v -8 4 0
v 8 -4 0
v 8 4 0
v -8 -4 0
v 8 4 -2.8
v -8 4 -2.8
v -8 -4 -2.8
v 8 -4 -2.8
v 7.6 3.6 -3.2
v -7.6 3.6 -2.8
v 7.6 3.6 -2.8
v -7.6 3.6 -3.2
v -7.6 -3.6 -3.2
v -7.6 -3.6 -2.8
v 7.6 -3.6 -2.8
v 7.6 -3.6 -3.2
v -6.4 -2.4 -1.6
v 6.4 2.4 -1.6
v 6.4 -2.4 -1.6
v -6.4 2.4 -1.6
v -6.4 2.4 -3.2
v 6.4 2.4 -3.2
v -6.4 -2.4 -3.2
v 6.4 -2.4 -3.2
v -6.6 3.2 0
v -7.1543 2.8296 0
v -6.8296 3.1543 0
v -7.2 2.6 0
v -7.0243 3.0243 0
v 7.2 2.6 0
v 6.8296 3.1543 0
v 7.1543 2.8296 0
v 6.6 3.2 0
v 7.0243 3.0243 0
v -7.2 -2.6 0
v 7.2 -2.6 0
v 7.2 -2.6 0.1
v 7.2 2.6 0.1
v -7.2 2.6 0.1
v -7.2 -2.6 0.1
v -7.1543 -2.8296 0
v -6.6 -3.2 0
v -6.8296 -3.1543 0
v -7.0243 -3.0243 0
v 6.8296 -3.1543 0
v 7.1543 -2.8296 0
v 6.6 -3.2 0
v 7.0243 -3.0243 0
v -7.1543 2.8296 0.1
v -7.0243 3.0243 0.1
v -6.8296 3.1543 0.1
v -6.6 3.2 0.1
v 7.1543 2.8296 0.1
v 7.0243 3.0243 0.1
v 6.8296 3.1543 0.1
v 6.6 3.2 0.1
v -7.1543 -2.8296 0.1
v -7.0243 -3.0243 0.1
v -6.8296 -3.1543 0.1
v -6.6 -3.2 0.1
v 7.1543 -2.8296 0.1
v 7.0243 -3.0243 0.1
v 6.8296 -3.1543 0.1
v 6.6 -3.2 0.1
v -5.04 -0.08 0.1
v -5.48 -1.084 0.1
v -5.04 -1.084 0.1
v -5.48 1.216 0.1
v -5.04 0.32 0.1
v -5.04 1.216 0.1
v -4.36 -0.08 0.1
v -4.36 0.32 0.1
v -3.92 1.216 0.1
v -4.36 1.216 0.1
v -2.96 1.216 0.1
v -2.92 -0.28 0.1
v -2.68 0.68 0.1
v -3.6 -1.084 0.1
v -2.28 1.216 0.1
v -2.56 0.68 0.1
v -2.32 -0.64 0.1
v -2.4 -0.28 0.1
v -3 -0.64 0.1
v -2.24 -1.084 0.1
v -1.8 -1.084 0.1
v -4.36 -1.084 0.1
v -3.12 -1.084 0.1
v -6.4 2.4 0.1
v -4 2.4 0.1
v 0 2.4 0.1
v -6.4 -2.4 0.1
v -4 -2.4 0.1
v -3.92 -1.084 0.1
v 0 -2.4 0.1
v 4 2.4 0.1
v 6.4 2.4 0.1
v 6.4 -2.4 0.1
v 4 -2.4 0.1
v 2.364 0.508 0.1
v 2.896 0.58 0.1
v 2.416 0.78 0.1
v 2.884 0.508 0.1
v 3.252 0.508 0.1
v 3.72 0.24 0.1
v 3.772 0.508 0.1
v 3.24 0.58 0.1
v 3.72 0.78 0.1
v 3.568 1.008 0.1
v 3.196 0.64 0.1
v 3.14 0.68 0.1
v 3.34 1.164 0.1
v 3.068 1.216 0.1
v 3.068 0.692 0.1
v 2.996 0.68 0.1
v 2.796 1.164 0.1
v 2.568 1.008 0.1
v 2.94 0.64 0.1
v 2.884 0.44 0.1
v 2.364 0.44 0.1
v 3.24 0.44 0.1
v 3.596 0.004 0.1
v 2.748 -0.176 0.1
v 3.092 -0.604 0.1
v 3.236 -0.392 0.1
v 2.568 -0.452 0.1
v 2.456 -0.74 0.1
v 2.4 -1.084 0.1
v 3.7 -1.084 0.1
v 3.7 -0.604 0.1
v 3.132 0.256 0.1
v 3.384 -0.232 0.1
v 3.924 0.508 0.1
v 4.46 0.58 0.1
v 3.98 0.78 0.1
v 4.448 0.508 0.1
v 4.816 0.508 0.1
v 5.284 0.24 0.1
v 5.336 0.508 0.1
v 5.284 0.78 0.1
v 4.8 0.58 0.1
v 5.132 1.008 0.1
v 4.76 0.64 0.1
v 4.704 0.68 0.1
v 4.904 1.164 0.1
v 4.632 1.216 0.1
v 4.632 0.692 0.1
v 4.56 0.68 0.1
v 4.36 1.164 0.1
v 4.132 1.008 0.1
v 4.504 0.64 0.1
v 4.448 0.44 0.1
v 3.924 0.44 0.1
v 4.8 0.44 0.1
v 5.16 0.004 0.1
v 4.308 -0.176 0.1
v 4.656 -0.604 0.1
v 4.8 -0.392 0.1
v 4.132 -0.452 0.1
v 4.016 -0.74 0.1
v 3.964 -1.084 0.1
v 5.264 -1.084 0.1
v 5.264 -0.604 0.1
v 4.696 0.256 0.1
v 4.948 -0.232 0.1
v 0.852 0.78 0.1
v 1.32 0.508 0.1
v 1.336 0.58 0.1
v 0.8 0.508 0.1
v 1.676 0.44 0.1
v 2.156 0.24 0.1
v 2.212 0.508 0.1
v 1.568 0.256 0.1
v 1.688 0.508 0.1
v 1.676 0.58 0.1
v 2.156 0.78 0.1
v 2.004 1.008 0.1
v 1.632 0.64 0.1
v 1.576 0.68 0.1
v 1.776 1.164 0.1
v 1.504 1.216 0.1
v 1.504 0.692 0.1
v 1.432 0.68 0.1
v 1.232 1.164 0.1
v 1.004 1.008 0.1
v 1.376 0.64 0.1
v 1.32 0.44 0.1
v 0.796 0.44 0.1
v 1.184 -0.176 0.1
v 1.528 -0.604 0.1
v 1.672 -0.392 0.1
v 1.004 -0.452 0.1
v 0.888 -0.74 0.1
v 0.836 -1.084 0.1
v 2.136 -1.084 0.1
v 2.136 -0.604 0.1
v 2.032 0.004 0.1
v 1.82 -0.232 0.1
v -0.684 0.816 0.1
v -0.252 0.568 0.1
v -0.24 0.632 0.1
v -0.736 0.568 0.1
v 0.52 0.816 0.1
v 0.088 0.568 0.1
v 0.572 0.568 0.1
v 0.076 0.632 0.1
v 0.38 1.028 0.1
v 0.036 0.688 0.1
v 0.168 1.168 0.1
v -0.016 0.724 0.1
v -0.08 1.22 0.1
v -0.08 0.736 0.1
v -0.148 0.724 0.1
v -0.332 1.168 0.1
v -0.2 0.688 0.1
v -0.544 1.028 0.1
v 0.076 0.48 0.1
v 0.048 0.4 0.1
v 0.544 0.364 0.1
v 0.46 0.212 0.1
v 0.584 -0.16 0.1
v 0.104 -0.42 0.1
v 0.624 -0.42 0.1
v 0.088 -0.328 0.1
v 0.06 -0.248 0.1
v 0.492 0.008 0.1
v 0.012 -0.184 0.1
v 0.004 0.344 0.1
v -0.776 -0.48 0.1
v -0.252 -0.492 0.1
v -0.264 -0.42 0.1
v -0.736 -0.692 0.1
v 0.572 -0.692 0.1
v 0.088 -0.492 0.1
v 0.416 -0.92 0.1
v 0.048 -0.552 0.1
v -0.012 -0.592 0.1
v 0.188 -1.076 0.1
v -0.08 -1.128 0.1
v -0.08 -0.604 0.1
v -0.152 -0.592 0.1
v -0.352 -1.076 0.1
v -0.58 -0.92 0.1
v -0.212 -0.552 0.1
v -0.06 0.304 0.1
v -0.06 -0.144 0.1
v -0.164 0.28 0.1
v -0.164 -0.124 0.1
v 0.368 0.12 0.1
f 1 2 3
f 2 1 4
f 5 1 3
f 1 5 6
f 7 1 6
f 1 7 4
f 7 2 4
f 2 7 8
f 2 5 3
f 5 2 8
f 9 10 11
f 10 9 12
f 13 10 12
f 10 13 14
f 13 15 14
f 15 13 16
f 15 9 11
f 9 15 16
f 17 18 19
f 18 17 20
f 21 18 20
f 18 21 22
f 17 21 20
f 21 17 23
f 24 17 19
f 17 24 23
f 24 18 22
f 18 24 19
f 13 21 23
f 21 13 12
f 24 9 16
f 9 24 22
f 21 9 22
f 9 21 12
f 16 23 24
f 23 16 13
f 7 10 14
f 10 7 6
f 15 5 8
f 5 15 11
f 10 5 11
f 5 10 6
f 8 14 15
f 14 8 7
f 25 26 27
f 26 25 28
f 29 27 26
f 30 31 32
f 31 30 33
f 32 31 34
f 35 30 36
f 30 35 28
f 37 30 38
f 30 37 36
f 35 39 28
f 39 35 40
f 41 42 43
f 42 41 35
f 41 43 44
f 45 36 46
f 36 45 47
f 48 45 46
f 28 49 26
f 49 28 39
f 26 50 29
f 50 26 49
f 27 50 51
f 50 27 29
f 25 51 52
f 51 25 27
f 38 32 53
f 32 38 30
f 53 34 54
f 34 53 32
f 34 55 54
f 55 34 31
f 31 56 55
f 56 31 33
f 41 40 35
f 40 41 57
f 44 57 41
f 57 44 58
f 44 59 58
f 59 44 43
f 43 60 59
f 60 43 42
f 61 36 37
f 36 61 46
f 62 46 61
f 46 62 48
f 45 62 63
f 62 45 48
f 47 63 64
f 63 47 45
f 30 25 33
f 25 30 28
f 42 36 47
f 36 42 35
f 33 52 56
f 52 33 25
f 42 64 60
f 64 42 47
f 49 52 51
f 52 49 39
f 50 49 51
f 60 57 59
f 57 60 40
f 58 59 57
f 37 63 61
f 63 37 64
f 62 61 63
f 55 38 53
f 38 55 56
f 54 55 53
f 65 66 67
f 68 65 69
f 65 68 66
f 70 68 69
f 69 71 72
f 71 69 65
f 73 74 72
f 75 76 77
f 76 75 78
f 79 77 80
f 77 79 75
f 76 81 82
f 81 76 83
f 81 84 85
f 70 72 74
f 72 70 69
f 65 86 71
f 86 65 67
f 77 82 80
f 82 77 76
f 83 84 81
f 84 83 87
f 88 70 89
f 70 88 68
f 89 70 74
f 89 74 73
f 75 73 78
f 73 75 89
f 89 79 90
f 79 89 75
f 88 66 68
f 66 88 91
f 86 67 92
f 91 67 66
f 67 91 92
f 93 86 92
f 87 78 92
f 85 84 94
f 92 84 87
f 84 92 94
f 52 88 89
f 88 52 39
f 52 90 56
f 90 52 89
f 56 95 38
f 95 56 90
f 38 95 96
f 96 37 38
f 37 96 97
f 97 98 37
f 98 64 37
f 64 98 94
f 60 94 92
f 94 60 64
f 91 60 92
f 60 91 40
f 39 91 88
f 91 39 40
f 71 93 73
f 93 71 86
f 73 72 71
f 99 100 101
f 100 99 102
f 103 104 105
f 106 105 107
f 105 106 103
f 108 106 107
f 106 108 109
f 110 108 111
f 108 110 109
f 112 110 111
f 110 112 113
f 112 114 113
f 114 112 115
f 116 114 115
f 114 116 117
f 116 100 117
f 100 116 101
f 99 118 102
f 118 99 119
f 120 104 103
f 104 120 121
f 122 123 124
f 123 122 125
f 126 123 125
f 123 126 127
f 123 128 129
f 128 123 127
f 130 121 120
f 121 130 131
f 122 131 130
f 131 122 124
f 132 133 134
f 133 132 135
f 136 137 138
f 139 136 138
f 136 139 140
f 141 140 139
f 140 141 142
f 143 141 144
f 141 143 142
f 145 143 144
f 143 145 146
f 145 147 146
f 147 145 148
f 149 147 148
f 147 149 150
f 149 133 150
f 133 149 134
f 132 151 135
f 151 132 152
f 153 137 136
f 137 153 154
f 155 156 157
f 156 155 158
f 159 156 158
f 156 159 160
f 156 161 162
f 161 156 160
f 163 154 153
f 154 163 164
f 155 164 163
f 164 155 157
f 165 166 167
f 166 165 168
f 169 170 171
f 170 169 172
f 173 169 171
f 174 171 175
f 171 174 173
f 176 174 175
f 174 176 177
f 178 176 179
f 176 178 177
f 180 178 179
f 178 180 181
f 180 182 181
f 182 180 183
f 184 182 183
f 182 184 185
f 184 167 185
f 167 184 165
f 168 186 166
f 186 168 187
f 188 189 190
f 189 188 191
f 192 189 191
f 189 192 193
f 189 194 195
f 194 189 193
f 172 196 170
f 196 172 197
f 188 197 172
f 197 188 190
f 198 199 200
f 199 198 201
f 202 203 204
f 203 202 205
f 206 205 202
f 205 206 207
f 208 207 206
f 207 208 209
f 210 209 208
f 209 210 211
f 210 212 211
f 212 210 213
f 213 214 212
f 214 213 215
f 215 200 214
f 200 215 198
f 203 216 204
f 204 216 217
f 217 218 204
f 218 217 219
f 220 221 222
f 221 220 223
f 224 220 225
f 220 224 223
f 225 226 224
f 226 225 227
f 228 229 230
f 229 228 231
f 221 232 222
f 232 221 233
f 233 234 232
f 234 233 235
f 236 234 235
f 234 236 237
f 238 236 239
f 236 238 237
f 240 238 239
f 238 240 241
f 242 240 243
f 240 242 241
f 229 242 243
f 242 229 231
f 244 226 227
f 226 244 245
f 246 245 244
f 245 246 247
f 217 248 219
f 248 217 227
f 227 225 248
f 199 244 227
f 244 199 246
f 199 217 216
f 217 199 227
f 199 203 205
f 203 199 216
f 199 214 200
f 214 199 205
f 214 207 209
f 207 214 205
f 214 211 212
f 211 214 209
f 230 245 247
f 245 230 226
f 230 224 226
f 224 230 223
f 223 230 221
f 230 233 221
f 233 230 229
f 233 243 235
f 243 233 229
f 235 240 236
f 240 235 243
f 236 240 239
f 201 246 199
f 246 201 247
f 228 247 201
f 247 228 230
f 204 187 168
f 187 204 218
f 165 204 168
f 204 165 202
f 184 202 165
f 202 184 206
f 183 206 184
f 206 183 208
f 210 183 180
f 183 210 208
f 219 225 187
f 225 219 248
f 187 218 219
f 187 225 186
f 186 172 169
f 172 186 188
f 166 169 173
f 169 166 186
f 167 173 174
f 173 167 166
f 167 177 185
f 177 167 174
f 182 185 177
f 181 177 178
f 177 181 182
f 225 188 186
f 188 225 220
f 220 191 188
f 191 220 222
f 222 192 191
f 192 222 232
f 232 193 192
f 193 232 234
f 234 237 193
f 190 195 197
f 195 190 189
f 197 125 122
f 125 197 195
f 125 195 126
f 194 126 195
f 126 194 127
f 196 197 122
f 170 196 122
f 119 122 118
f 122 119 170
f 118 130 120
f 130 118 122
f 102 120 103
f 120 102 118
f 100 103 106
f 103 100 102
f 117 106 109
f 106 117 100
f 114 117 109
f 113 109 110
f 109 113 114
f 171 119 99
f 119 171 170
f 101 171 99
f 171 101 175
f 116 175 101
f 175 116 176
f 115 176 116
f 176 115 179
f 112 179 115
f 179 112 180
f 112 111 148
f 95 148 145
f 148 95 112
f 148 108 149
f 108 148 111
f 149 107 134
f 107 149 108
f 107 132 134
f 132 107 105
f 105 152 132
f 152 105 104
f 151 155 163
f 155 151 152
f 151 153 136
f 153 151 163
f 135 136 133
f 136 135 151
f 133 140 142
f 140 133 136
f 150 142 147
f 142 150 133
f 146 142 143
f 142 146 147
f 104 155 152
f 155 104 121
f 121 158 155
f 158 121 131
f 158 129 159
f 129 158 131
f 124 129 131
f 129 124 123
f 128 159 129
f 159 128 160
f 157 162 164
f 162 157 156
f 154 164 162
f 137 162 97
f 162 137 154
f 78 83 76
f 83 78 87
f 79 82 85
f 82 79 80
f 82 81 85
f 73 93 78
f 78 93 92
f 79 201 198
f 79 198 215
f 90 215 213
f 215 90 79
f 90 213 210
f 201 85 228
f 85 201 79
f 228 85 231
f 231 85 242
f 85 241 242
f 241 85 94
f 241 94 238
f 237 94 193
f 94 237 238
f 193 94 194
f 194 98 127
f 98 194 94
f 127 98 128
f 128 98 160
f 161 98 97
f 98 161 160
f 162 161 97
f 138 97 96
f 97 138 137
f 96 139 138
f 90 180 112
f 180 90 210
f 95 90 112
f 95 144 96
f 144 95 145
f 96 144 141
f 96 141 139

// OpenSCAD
// file: ../p/box3u12.scad
use <../lib.scad>
function ldraw_lib__box3u12() = [
// 0 Box with 3 Parallel Faces without Any Edges
// 0 Name: box3u12.dat
// 0 Author: J.C. Tchang [tchang]
// 0 !LDRAW_ORG Primitive UPDATE 2014-02
// 0 !LICENSE Licensed under CC BY 4.0 : see CAreadme.txt
// 
// 0 BFC CERTIFY CCW
  [0,"BFC","CERTIFY"],
  [0,"BFC","CCW"],
// 
// 0 !HISTORY 2014-12-23 [PTadmin] Official Update 2014-02
// 
// 
// 4 16 -1 1 1 1 1 1 1 1 -1 -1 1 -1
  [4,16,-1,1,1,1,1,1,1,1,-1,-1,1,-1],
// 4 16 -1 1 1 -1 0 1 1 0 1 1 1 1
  [4,16,-1,1,1,-1,0,1,1,0,1,1,1,1],
// 4 16 1 1 -1 1 0 -1 -1 0 -1 -1 1 -1
  [4,16,1,1,-1,1,0,-1,-1,0,-1,-1,1,-1],
];
module ldraw_lib__box3u12(step=0, col=false, unit=2/5, alt=false, line=0.2, solid=!$preview)
    makepoly(ldraw_lib__box3u12(), step=step, col=col, unit=unit, alt=alt, line=line, solid=solid);
ldraw_lib__box3u12(line=0.2);
// file: ../p/1-4cyli.scad
use <../lib.scad>
function ldraw_lib__1_4cyli() = [
// 0 Cylinder 0.25
// 0 Name: 1-4cyli.dat
// 0 Author: James Jessiman
// 0 !LDRAW_ORG Primitive UPDATE 2012-01
// 0 !LICENSE Licensed under CC BY 4.0 : see CAreadme.txt
// 
// 0 BFC CERTIFY CCW
  [0,"BFC","CERTIFY"],
  [0,"BFC","CCW"],
// 
// 0 !HISTORY 2002-03-23 [sbliss] Added BFC statement.
// 0 !HISTORY 2002-04-25 [PTadmin] Official Update 2002-02
// 0 !HISTORY 2007-06-22 [PTadmin] Header formatted for Contributor Agreement
// 0 !HISTORY 2008-07-01 [PTadmin] Official Update 2008-01
// 0 !HISTORY 2012-02-16 [Philo] Changed to CCW
// 0 !HISTORY 2012-03-30 [PTadmin] Official Update 2012-01
// 
// 
// 4 16 1 1 0 0.9239 1 0.3827 0.9239 0 0.3827 1 0 0
  [4,16,1,1,0,0.9239,1,0.3827,0.9239,0,0.3827,1,0,0],
// 5 24 1 0 0 1 1 0 0.9239 0 0.3827 1 0 -1
  [5,24,1,0,0,1,1,0,0.9239,0,0.3827,1,0,-1],
// 4 16 0.9239 1 0.3827 0.7071 1 0.7071 0.7071 0 0.7071 0.9239 0 0.3827
  [4,16,0.9239,1,0.3827,0.7071,1,0.7071,0.7071,0,0.7071,0.9239,0,0.3827],
// 5 24 0.9239 0 0.3827 0.9239 1 0.3827 0.7071 0 0.7071 1 0 0
  [5,24,0.9239,0,0.3827,0.9239,1,0.3827,0.7071,0,0.7071,1,0,0],
// 4 16 0.7071 1 0.7071 0.3827 1 0.9239 0.3827 0 0.9239 0.7071 0 0.7071
  [4,16,0.7071,1,0.7071,0.3827,1,0.9239,0.3827,0,0.9239,0.7071,0,0.7071],
// 5 24 0.7071 0 0.7071 0.7071 1 0.7071 0.3827 0 0.9239 0.9239 0 0.3827
  [5,24,0.7071,0,0.7071,0.7071,1,0.7071,0.3827,0,0.9239,0.9239,0,0.3827],
// 4 16 0.3827 1 0.9239 0 1 1 0 0 1 0.3827 0 0.9239
  [4,16,0.3827,1,0.9239,0,1,1,0,0,1,0.3827,0,0.9239],
// 5 24 0.3827 0 0.9239 0.3827 1 0.9239 0 0 1 0.7071 0 0.7071
  [5,24,0.3827,0,0.9239,0.3827,1,0.9239,0,0,1,0.7071,0,0.7071],
// 5 24 0 0 1 0 1 1 0.3827 0 0.9239 -1 0 1
  [5,24,0,0,1,0,1,1,0.3827,0,0.9239,-1,0,1],
];
module ldraw_lib__1_4cyli(step=0, col=false, unit=2/5, alt=false, line=0.2, solid=!$preview)
    makepoly(ldraw_lib__1_4cyli(), step=step, col=col, unit=unit, alt=alt, line=line, solid=solid);
ldraw_lib__1_4cyli(line=0.2);
// file: ../p/box5.scad
use <../lib.scad>
function ldraw_lib__box5() = [
// 0 Box with 5 Faces and All Edges
// 0 Name: box5.dat
// 0 Author: James Jessiman
// 0 !LDRAW_ORG Primitive UPDATE 2012-01
// 0 !LICENSE Licensed under CC BY 4.0 : see CAreadme.txt
// 
// 0 BFC CERTIFY CCW
  [0,"BFC","CERTIFY"],
  [0,"BFC","CCW"],
// 
// 0 !HISTORY 2002-04-03 [sbliss] Modified for BFC compliance
// 0 !HISTORY 2002-04-25 [PTadmin] Official Update 2002-02
// 0 !HISTORY 2007-06-24 [PTadmin] Header formatted for Contributor Agreement
// 0 !HISTORY 2008-07-01 [PTadmin] Official Update 2008-01
// 0 !HISTORY 2012-02-16 [Philo] Changed to CCW
// 0 !HISTORY 2012-03-30 [PTadmin] Official Update 2012-01
// 
// 
// 2 24 1 1 1 -1 1 1
  [2,24,1,1,1,-1,1,1],
// 2 24 -1 1 1 -1 1 -1
  [2,24,-1,1,1,-1,1,-1],
// 2 24 -1 1 -1 1 1 -1
  [2,24,-1,1,-1,1,1,-1],
// 2 24 1 1 -1 1 1 1
  [2,24,1,1,-1,1,1,1],
// 2 24 1 0 1 -1 0 1
  [2,24,1,0,1,-1,0,1],
// 2 24 -1 0 1 -1 0 -1
  [2,24,-1,0,1,-1,0,-1],
// 2 24 -1 0 -1 1 0 -1
  [2,24,-1,0,-1,1,0,-1],
// 2 24 1 0 -1 1 0 1
  [2,24,1,0,-1,1,0,1],
// 2 24 1 0 1 1 1 1
  [2,24,1,0,1,1,1,1],
// 2 24 -1 0 1 -1 1 1
  [2,24,-1,0,1,-1,1,1],
// 2 24 1 0 -1 1 1 -1
  [2,24,1,0,-1,1,1,-1],
// 2 24 -1 0 -1 -1 1 -1
  [2,24,-1,0,-1,-1,1,-1],
// 4 16 -1 1 1 1 1 1 1 1 -1 -1 1 -1
  [4,16,-1,1,1,1,1,1,1,1,-1,-1,1,-1],
// 4 16 -1 1 1 -1 0 1 1 0 1 1 1 1
  [4,16,-1,1,1,-1,0,1,1,0,1,1,1,1],
// 4 16 -1 1 -1 -1 0 -1 -1 0 1 -1 1 1
  [4,16,-1,1,-1,-1,0,-1,-1,0,1,-1,1,1],
// 4 16 1 1 -1 1 0 -1 -1 0 -1 -1 1 -1
  [4,16,1,1,-1,1,0,-1,-1,0,-1,-1,1,-1],
// 4 16 1 1 1 1 0 1 1 0 -1 1 1 -1
  [4,16,1,1,1,1,0,1,1,0,-1,1,1,-1],
];
module ldraw_lib__box5(step=0, col=false, unit=2/5, alt=false, line=0.2, solid=!$preview)
    makepoly(ldraw_lib__box5(), step=step, col=col, unit=unit, alt=alt, line=line, solid=solid);
ldraw_lib__box5(line=0.2);
// file: ../p/box4.scad
use <../lib.scad>
function ldraw_lib__box4() = [
// 0 Box with 4 Faces (2 Parallel Pairs) and All Edges
// 0 Name: box4.dat
// 0 Author: James Jessiman
// 0 !LDRAW_ORG Primitive UPDATE 2012-01
// 0 !LICENSE Licensed under CC BY 4.0 : see CAreadme.txt
// 
// 0 BFC CERTIFY CCW
  [0,"BFC","CERTIFY"],
  [0,"BFC","CCW"],
// 
// 0 !HISTORY 2002-04-03 [sbliss] Modified for BFC compliance
// 0 !HISTORY 2002-04-25 [PTadmin] Official Update 2002-02
// 0 !HISTORY 2007-06-24 [PTadmin] Header formatted for Contributor Agreement
// 0 !HISTORY 2008-07-01 [PTadmin] Official Update 2008-01
// 0 !HISTORY 2012-02-16 [Philo] Changed to CCW
// 0 !HISTORY 2012-03-30 [PTadmin] Official Update 2012-01
// 
// 
// 2 24 1 1 1 -1 1 1
  [2,24,1,1,1,-1,1,1],
// 2 24 -1 1 1 -1 1 -1
  [2,24,-1,1,1,-1,1,-1],
// 2 24 -1 1 -1 1 1 -1
  [2,24,-1,1,-1,1,1,-1],
// 2 24 1 1 -1 1 1 1
  [2,24,1,1,-1,1,1,1],
// 2 24 1 0 1 -1 0 1
  [2,24,1,0,1,-1,0,1],
// 2 24 -1 0 1 -1 0 -1
  [2,24,-1,0,1,-1,0,-1],
// 2 24 -1 0 -1 1 0 -1
  [2,24,-1,0,-1,1,0,-1],
// 2 24 1 0 -1 1 0 1
  [2,24,1,0,-1,1,0,1],
// 2 24 1 0 1 1 1 1
  [2,24,1,0,1,1,1,1],
// 2 24 -1 0 1 -1 1 1
  [2,24,-1,0,1,-1,1,1],
// 2 24 1 0 -1 1 1 -1
  [2,24,1,0,-1,1,1,-1],
// 2 24 -1 0 -1 -1 1 -1
  [2,24,-1,0,-1,-1,1,-1],
// 4 16 -1 1 1 -1 0 1 1 0 1 1 1 1
  [4,16,-1,1,1,-1,0,1,1,0,1,1,1,1],
// 4 16 -1 1 -1 -1 0 -1 -1 0 1 -1 1 1
  [4,16,-1,1,-1,-1,0,-1,-1,0,1,-1,1,1],
// 4 16 1 1 -1 1 0 -1 -1 0 -1 -1 1 -1
  [4,16,1,1,-1,1,0,-1,-1,0,-1,-1,1,-1],
// 4 16 1 1 1 1 0 1 1 0 -1 1 1 -1
  [4,16,1,1,1,1,0,1,1,0,-1,1,1,-1],
];
module ldraw_lib__box4(step=0, col=false, unit=2/5, alt=false, line=0.2, solid=!$preview)
    makepoly(ldraw_lib__box4(), step=step, col=col, unit=unit, alt=alt, line=line, solid=solid);
ldraw_lib__box4(line=0.2);
// file: s/stickerback008x018.scad
use <../../lib.scad>
use <../../p/1-4chrd.scad>
use <../../p/1-4cyli.scad>
use <../../p/box3u12.scad>
function ldraw_lib__s__stickerback008x018() = [
// 0 ~Sticker Back  0.8 x  1.8
// 0 Name: s\stickerback008x018.dat
// 0 Author: Massimo Maso [Sirio]
// 0 !LDRAW_ORG Subpart UPDATE 2025-08
// 0 !LICENSE Licensed under CC BY 4.0 : see CAreadme.txt
// 
// 0 BFC CERTIFY CCW
  [0,"BFC","CERTIFY"],
  [0,"BFC","CCW"],
// 
// 0 !HISTORY 2025-08-31 [OrionP] Official Update 2025-08
// 
// 0 // Primitives
// 1 16 -16.5 0 6.5 -1.5 0 0 0 -1 0 0 0 1.5 1-4chrd.dat
  [1,16,-16.5,0,6.5,-1.5,0,0,0,-1,0,0,0,1.5, ldraw_lib__1_4chrd()],
// 1 16 16.5 0 6.5 1.5 0 0 0 -1 0 0 0 1.5 1-4chrd.dat
  [1,16,16.5,0,6.5,1.5,0,0,0,-1,0,0,0,1.5, ldraw_lib__1_4chrd()],
// 1 16 0 -.25 0 0 0 18 0 .25 0 6.5 0 0 box3u12.dat
  [1,16,0,-.25,0,0,0,18,0,.25,0,6.5,0,0, ldraw_lib__box3u12()],
// 1 16 -16.5 0 -6.5 -1.5 0 0 0 -1 0 0 0 -1.5 1-4chrd.dat
  [1,16,-16.5,0,-6.5,-1.5,0,0,0,-1,0,0,0,-1.5, ldraw_lib__1_4chrd()],
// 1 16 16.5 0 -6.5 1.5 0 0 0 -1 0 0 0 -1.5 1-4chrd.dat
  [1,16,16.5,0,-6.5,1.5,0,0,0,-1,0,0,0,-1.5, ldraw_lib__1_4chrd()],
// 1 16 -16.5 0 6.5 -1.5 0 0 0 -.25 0 0 0 1.5 1-4cyli.dat
  [1,16,-16.5,0,6.5,-1.5,0,0,0,-.25,0,0,0,1.5, ldraw_lib__1_4cyli()],
// 1 16 16.5 0 6.5 1.5 0 0 0 -.25 0 0 0 1.5 1-4cyli.dat
  [1,16,16.5,0,6.5,1.5,0,0,0,-.25,0,0,0,1.5, ldraw_lib__1_4cyli()],
// 1 16 -16.5 0 -6.5 -1.5 0 0 0 -.25 0 0 0 -1.5 1-4cyli.dat
  [1,16,-16.5,0,-6.5,-1.5,0,0,0,-.25,0,0,0,-1.5, ldraw_lib__1_4cyli()],
// 1 16 16.5 0 -6.5 1.5 0 0 0 -.25 0 0 0 -1.5 1-4cyli.dat
  [1,16,16.5,0,-6.5,1.5,0,0,0,-.25,0,0,0,-1.5, ldraw_lib__1_4cyli()],
// 0 // Bottom face
// 4 16 -18 0 6.5 -16.5 0 8 16.5 0 8 18 0 6.5
  [4,16,-18,0,6.5,-16.5,0,8,16.5,0,8,18,0,6.5],
// 4 16 -18 0 -6.5 18 0 -6.5 16.5 0 -8 -16.5 0 -8
  [4,16,-18,0,-6.5,18,0,-6.5,16.5,0,-8,-16.5,0,-8],
// 0 // Lateral face
// 4 16 -16.5 0 8 -16.5 -.25 8 16.5 -.25 8 16.5 0 8
  [4,16,-16.5,0,8,-16.5,-.25,8,16.5,-.25,8,16.5,0,8],
// 4 16 -16.5 0 -8 16.5 0 -8 16.5 -.25 -8 -16.5 -.25 -8
  [4,16,-16.5,0,-8,16.5,0,-8,16.5,-.25,-8,-16.5,-.25,-8],
];
module ldraw_lib__s__stickerback008x018(step=0, col=false, unit=2/5, alt=false, line=0.2, solid=!$preview)
    makepoly(ldraw_lib__s__stickerback008x018(), step=step, col=col, unit=unit, alt=alt, line=line, solid=solid);
ldraw_lib__s__stickerback008x018(line=0.2);
// file: ../p/1-4chrd.scad
use <../lib.scad>
function ldraw_lib__1_4chrd() = [
// 0 Chord 0.25
// 0 Name: 1-4chrd.dat
// 0 Author: Max Martin Richter [MMR1988]
// 0 !LDRAW_ORG Primitive UPDATE 2023-05
// 0 !LICENSE Licensed under CC BY 4.0 : see CAreadme.txt
// 
// 0 BFC CERTIFY CCW
  [0,"BFC","CERTIFY"],
  [0,"BFC","CCW"],
// 
// 0 !HISTORY 2004-04-22 [PTadmin] Official Update 2004-02
// 0 !HISTORY 2007-10-09 [PTadmin] Header formatted for Contributor Agreement
// 0 !HISTORY 2008-07-01 [PTadmin] Official Update 2008-01
// 0 !HISTORY 2012-08-02 [MMR1988] Re-creation with PrimGen2 and Rectifier
// 0 !HISTORY 2012-08-09 [PTadmin] Official Update 2012-02
// 0 !HISTORY 2023-10-27 [OrionP] Change author to MMR1988 from hafhead
// 0 !HISTORY 2023-10-31 [OrionP] Official Update 2023-05
// 
// 4 16 0.9239 0 0.3827 0.3827 0 0.9239 0 0 1 1 0 0
  [4,16,0.9239,0,0.3827,0.3827,0,0.9239,0,0,1,1,0,0],
// 3 16 0.7071 0 0.7071 0.3827 0 0.9239 0.9239 0 0.3827
  [3,16,0.7071,0,0.7071,0.3827,0,0.9239,0.9239,0,0.3827],
];
module ldraw_lib__1_4chrd(step=0, col=false, unit=2/5, alt=false, line=0.2, solid=!$preview)
    makepoly(ldraw_lib__1_4chrd(), step=step, col=col, unit=unit, alt=alt, line=line, solid=solid);
ldraw_lib__1_4chrd(line=0.2);
// file: s/3069bs01.scad
use <../../lib.scad>
use <../../p/box4.scad>
use <../../p/box5.scad>
function ldraw_lib__s__3069bs01() = [
// 0 ~Tile  1 x  2 with Groove without Top Face
// 0 Name: s\3069bs01.dat
// 0 Author: Santeri Piippo [arezey]
// 0 !LDRAW_ORG Subpart UPDATE 2010-02
// 0 !LICENSE Licensed under CC BY 4.0 : see CAreadme.txt
// 
// 0 BFC CERTIFY CCW
  [0,"BFC","CERTIFY"],
  [0,"BFC","CCW"],
// 
// 0 !HISTORY 2010-07-05 [PTadmin] Official Update 2010-02
// 
// 
// 1 16 0 0 0 20 0 0 0 7 0 0 0 10 box4.dat
  [1,16,0,0,0,20,0,0,0,7,0,0,0,10, ldraw_lib__box4()],
// 1 16 0 7 0 19 0 0 0 1 0 0 0 9 box4.dat
  [1,16,0,7,0,19,0,0,0,1,0,0,0,9, ldraw_lib__box4()],
// 0 BFC INVERTNEXT
  [0,"BFC","INVERTNEXT"],
// 1 16 0 8 0 16 0 0 0 -4 0 0 0 6 box5.dat
  [1,16,0,8,0,16,0,0,0,-4,0,0,0,6, ldraw_lib__box5()],
// 4 16 -19 8 9 -16 8 6 -16 8 -6 -19 8 -9
  [4,16,-19,8,9,-16,8,6,-16,8,-6,-19,8,-9],
// 4 16 19 8 -9 16 8 -6 16 8 6 19 8 9
  [4,16,19,8,-9,16,8,-6,16,8,6,19,8,9],
// 4 16 19 8 9 16 8 6 -16 8 6 -19 8 9
  [4,16,19,8,9,16,8,6,-16,8,6,-19,8,9],
// 4 16 -19 8 -9 -16 8 -6 16 8 -6 19 8 -9
  [4,16,-19,8,-9,-16,8,-6,16,8,-6,19,8,-9],
// 4 16 -20 7 10 -19 7 9 -19 7 -9 -20 7 -10
  [4,16,-20,7,10,-19,7,9,-19,7,-9,-20,7,-10],
// 4 16 20 7 -10 19 7 -9 19 7 9 20 7 10
  [4,16,20,7,-10,19,7,-9,19,7,9,20,7,10],
// 4 16 20 7 10 19 7 9 -19 7 9 -20 7 10
  [4,16,20,7,10,19,7,9,-19,7,9,-20,7,10],
// 4 16 -20 7 -10 -19 7 -9 19 7 -9 20 7 -10
  [4,16,-20,7,-10,-19,7,-9,19,7,-9,20,7,-10],
// 0 //
];
module ldraw_lib__s__3069bs01(step=0, col=false, unit=2/5, alt=false, line=0.2, solid=!$preview)
    makepoly(ldraw_lib__s__3069bs01(), step=step, col=col, unit=unit, alt=alt, line=line, solid=solid);
ldraw_lib__s__3069bs01(line=0.2);
// file: 3069b.scad
use <../lib.scad>
use <s/3069bs01.scad>
function ldraw_lib__3069b() = [
// 0 Tile  1 x  2 with Groove
// 0 Name: 3069b.dat
// 0 Author: Santeri Piippo [arezey]
// 0 !LDRAW_ORG Part UPDATE 2010-02
// 0 !LICENSE Licensed under CC BY 4.0 : see CAreadme.txt
// 
// 0 BFC CERTIFY CCW
  [0,"BFC","CERTIFY"],
  [0,"BFC","CCW"],
// 
// 0 !KEYWORDS BrickLink 3069
// 
// 0 !HISTORY 2010-07-05 [PTadmin] Official Update 2010-02
// 
// 
// 4 16 20 0 -10 20 0 10 -20 0 10 -20 0 -10
  [4,16,20,0,-10,20,0,10,-20,0,10,-20,0,-10],
// 1 16 0 0 0 1 0 0 0 1 0 0 0 1 s\3069bs01.dat
  [1,16,0,0,0,1,0,0,0,1,0,0,0,1, ldraw_lib__s__3069bs01()],
// 0 //
];
module ldraw_lib__3069b(step=0, col=false, unit=2/5, alt=false, line=0.2, solid=!$preview)
    makepoly(ldraw_lib__3069b(), step=step, col=col, unit=unit, alt=alt, line=line, solid=solid);
ldraw_lib__3069b(line=0.2);
// main file
use <../lib.scad>
use <3069b.scad>
use <4578235b.scad>
function ldraw_lib__3069bd0y() = [
// 0 Tile  1 x  2 with Black "HA 3222" on White Background and Black Border Sticker
// 0 Name: 3069bd0y.dat
// 0 Author: Evert-Jan Boer [ejboer]
// 0 !LDRAW_ORG Shortcut UPDATE 2026-07
// 0 !LICENSE Licensed under CC BY 4.0 : see CAreadme.txt
// 
// 0 BFC CERTIFY CCW
  [0,"BFC","CERTIFY"],
  [0,"BFC","CCW"],
// 
// 0 !CATEGORY Sticker Shortcut
// 0 !KEYWORDS Bricklink 3069pb0153, Set 3222
// 
// 0 !HISTORY 2026-07-30 [OrionP] Official Update 2026-07
// 
// 1 16 0 0 0 1 0 0 0 1 0 0 0 1 3069b.dat
  [1,16,0,0,0,1,0,0,0,1,0,0,0,1, ldraw_lib__3069b()],
// 1 16 0 0 0 1 0 0 0 1 0 0 0 1 4578235b.dat
  [1,16,0,0,0,1,0,0,0,1,0,0,0,1, ldraw_lib__4578235b()],
];
module ldraw_lib__3069bd0y(step=0, col=false, unit=2/5, alt=false, line=0.2, solid=!$preview)
    makepoly(ldraw_lib__3069bd0y(), step=step, col=col, unit=unit, alt=alt, line=line, solid=solid);
ldraw_lib__3069bd0y(line=0.2);
